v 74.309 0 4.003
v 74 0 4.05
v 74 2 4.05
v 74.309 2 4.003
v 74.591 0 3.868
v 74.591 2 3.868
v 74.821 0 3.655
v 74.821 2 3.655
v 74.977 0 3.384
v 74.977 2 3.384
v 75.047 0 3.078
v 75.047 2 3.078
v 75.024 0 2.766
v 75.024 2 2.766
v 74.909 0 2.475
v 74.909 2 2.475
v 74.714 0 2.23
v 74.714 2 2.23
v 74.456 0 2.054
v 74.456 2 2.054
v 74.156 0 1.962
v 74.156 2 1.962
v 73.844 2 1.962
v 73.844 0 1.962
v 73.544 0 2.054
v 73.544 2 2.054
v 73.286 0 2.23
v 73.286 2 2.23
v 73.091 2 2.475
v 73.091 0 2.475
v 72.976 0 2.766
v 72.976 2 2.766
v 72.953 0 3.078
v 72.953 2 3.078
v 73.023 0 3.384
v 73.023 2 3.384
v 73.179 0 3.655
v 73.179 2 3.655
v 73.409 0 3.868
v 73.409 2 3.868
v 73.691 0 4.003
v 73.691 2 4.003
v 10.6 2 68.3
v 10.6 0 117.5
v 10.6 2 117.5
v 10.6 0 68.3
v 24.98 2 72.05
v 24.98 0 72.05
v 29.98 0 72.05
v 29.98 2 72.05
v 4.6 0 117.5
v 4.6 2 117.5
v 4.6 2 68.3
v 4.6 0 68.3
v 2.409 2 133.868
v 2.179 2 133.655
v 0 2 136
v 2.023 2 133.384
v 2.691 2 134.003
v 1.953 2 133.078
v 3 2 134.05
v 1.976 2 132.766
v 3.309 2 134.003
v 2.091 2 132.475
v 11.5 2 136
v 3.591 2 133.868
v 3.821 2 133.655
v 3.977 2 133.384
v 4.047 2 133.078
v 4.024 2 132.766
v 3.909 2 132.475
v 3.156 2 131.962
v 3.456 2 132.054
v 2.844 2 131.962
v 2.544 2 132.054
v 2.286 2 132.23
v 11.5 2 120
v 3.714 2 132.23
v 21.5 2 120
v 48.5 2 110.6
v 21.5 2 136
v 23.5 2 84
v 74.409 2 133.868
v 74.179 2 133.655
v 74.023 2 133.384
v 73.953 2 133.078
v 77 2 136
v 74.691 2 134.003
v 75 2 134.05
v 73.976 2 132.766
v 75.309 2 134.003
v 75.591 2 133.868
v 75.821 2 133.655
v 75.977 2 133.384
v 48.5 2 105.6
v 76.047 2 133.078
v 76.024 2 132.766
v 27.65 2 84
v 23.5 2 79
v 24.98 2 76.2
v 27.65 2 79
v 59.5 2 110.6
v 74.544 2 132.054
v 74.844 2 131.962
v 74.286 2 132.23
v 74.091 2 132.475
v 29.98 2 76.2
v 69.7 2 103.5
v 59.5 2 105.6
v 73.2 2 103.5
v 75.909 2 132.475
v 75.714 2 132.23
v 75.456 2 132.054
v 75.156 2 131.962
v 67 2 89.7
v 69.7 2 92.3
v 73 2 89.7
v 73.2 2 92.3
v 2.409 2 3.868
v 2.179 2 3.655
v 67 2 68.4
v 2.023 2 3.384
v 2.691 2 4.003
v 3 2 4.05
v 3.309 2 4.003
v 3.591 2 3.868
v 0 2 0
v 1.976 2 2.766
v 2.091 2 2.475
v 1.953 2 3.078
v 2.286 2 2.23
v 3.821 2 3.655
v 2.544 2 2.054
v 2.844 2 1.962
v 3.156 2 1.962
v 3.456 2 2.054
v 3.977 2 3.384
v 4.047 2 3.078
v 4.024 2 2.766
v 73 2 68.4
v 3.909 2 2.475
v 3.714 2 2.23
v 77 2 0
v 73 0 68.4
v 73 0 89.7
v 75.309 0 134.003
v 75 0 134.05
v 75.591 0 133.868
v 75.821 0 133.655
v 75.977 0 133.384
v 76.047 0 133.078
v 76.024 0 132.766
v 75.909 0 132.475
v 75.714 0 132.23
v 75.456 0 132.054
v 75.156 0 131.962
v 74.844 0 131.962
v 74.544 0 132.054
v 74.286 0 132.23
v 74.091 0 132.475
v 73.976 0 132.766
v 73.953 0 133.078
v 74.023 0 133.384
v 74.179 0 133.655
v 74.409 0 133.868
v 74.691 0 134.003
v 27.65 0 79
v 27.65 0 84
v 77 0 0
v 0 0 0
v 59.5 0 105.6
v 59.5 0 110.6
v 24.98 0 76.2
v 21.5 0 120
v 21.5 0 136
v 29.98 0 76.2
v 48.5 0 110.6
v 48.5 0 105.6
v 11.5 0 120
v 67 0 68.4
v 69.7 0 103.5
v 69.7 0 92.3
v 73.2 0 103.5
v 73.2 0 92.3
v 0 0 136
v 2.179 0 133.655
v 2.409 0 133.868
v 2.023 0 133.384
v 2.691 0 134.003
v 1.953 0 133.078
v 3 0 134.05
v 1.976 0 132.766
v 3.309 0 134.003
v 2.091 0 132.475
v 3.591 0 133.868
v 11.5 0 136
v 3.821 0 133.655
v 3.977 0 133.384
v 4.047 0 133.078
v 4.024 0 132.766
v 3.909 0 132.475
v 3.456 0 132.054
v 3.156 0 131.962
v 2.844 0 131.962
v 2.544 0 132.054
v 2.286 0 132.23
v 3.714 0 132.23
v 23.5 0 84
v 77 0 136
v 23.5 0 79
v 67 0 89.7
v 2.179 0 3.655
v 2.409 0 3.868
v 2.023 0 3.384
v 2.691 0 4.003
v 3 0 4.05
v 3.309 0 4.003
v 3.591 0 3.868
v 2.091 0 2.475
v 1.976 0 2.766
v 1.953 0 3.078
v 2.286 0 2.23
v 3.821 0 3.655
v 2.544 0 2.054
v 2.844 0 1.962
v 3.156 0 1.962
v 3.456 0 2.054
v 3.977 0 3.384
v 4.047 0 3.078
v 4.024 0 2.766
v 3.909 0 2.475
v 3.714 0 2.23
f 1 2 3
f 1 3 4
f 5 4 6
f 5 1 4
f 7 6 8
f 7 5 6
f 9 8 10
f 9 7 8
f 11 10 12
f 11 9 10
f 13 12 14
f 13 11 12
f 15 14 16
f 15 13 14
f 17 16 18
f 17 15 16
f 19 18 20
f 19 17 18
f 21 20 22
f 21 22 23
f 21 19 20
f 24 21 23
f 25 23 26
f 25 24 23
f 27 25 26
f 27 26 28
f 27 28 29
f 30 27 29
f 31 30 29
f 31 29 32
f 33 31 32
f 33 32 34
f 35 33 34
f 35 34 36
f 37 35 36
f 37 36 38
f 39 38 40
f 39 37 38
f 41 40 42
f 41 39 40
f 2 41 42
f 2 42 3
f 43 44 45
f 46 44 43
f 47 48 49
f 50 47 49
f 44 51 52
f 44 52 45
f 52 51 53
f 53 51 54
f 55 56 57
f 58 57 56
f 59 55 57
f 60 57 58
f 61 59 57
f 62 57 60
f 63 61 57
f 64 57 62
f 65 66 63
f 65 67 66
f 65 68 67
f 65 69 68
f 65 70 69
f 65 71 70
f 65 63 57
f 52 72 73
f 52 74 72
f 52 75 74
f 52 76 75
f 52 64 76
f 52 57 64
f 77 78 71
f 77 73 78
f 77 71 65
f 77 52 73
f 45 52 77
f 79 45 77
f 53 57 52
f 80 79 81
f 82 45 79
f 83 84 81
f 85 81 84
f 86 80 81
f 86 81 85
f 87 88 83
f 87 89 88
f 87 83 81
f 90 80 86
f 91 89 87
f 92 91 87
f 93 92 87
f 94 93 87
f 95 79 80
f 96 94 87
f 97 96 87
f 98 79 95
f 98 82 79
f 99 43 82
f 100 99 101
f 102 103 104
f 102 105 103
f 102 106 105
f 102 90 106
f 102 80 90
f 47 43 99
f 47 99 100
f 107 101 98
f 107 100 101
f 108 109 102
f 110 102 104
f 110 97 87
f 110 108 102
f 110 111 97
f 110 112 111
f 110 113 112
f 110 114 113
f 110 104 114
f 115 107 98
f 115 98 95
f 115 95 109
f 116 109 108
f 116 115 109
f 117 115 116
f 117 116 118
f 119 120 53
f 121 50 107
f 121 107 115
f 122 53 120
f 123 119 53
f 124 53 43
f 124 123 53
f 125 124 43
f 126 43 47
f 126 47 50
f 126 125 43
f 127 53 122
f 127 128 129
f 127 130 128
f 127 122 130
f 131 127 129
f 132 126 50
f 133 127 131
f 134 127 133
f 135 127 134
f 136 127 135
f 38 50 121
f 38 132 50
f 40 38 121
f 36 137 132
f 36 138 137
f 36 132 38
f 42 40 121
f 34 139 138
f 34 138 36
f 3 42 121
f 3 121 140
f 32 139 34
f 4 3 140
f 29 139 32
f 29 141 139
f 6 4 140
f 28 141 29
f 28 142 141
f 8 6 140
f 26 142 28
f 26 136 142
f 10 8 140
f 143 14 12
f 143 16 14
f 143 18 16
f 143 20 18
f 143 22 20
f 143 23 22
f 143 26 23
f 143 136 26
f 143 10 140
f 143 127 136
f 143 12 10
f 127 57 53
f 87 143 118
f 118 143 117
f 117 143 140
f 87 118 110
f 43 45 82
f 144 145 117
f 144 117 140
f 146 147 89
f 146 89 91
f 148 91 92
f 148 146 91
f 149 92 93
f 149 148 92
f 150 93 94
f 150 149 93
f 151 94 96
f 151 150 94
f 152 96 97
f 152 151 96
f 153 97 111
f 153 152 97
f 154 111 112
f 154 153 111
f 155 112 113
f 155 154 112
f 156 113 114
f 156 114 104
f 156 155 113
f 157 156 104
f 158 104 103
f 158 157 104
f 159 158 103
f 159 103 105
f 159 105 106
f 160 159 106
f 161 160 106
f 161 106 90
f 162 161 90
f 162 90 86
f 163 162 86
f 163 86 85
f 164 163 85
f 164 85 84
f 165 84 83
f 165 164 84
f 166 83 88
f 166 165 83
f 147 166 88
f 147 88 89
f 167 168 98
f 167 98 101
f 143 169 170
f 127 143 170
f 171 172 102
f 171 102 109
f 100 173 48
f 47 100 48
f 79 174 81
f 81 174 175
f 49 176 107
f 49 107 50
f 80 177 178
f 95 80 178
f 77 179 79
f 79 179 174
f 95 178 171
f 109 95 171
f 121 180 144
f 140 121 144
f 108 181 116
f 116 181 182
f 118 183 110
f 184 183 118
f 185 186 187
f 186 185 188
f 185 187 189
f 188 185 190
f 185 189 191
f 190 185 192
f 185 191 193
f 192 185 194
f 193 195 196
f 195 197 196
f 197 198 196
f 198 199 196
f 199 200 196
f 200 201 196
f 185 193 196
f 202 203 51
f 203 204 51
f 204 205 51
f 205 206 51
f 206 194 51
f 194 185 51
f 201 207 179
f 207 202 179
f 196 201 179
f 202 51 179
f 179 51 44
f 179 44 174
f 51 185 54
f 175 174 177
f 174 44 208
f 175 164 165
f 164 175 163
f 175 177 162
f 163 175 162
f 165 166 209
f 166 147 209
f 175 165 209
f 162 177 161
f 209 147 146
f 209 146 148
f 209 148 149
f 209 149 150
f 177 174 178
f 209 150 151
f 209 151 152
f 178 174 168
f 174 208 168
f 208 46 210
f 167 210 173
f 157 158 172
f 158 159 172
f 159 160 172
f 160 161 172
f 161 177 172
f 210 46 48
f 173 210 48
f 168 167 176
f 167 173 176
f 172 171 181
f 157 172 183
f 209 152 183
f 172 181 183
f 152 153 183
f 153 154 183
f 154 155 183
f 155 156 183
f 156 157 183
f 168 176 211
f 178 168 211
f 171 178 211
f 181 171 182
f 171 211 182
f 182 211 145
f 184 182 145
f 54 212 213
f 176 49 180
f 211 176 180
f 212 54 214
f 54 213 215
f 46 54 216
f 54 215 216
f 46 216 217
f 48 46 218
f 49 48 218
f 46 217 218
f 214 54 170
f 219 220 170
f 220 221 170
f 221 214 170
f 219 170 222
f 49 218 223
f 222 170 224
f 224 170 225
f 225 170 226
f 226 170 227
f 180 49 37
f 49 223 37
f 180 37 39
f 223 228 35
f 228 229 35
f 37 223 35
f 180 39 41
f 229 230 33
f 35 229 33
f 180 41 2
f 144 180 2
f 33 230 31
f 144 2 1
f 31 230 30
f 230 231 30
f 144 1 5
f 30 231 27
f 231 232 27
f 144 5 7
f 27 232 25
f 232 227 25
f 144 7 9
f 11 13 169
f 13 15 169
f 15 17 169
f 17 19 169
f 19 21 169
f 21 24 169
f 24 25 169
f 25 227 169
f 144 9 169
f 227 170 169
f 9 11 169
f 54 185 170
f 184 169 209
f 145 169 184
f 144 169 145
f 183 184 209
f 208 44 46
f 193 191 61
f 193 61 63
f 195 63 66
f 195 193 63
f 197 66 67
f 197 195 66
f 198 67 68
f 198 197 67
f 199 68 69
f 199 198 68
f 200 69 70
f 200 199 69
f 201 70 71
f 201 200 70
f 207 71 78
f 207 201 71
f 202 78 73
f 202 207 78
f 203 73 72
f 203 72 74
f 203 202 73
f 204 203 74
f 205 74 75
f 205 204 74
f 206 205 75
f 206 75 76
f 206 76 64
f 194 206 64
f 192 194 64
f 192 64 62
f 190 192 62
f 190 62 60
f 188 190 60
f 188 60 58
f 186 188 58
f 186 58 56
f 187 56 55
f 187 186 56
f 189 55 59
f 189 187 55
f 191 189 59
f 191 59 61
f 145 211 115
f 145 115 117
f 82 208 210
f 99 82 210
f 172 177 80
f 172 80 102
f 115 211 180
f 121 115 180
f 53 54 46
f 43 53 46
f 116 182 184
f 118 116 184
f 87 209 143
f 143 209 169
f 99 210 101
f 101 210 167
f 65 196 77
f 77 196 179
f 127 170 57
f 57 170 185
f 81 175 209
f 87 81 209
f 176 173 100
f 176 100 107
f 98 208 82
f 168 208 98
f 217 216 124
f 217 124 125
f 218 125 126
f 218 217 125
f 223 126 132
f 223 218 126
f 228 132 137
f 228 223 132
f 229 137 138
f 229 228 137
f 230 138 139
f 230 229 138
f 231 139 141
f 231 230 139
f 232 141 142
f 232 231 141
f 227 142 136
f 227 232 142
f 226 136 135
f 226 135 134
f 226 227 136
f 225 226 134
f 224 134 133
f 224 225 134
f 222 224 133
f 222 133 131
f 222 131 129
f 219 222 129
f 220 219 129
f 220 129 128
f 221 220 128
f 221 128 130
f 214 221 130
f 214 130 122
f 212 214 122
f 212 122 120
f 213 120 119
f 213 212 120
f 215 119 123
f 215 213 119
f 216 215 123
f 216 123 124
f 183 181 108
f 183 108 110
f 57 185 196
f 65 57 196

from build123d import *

# Parameters (mm, degrees)
SKETCH_2_R      = 1.05
SKETCH_2_W      = 6
SKETCH_2_H      = 49.2
SKETCH_2_W_2    = 4.15
SKETCH_2_H_2    = 5
SKETCH_2_W_3    = 5
SKETCH_2_H_3    = 4.15
SKETCH_2_W_4    = 11
SKETCH_2_W_5    = 3.5
SKETCH_2_H_4    = 11.2
SKETCH_2_H_5    = 21.3
EXTRUDE_1_DEPTH = 2


with BuildPart() as part:
    # 草图2 → 凸台-拉伸1 (new body)
    with BuildSketch(Plane(origin=(0, 0, 0), x_dir=(1, 0, 0), z_dir=(0, 1, 0))):
        Polygon((77, 0), (0, 0), (0, -136), (11.5, -136), (11.5, -120), (21.5, -120), (21.5, -136), (77, -136), align=None)
        with Locations(Location((3, -133, 0), (0, 0, 270))):
            Circle(SKETCH_2_R, mode=Mode.SUBTRACT)
        with Locations((7.6, -92.9)):
            Rectangle(SKETCH_2_W, SKETCH_2_H, mode=Mode.SUBTRACT)
        with Locations((25.575, -81.5)):
            Rectangle(SKETCH_2_W_2, SKETCH_2_H_2, mode=Mode.SUBTRACT)
        with Locations((27.48, -74.125)):
            Rectangle(SKETCH_2_W_3, SKETCH_2_H_3, mode=Mode.SUBTRACT)
        with Locations((54, -108.1)):
            Rectangle(SKETCH_2_W_4, SKETCH_2_H_2, mode=Mode.SUBTRACT)
        with Locations(Location((75, -133, 0), (0, 0, 270))):
            Circle(SKETCH_2_R, mode=Mode.SUBTRACT)
        with Locations((71.45, -97.9)):
            Rectangle(SKETCH_2_W_5, SKETCH_2_H_4, mode=Mode.SUBTRACT)
        with Locations((70, -79.05)):
            Rectangle(SKETCH_2_W, SKETCH_2_H_5, mode=Mode.SUBTRACT)
        with Locations(Location((3, -3, 0), (0, 0, 270))):
            Circle(SKETCH_2_R, mode=Mode.SUBTRACT)
        with Locations(Location((74, -3, 0), (0, 0, 270))):
            Circle(SKETCH_2_R, mode=Mode.SUBTRACT)
    extrude(amount=EXTRUDE_1_DEPTH)


solid = part.part
